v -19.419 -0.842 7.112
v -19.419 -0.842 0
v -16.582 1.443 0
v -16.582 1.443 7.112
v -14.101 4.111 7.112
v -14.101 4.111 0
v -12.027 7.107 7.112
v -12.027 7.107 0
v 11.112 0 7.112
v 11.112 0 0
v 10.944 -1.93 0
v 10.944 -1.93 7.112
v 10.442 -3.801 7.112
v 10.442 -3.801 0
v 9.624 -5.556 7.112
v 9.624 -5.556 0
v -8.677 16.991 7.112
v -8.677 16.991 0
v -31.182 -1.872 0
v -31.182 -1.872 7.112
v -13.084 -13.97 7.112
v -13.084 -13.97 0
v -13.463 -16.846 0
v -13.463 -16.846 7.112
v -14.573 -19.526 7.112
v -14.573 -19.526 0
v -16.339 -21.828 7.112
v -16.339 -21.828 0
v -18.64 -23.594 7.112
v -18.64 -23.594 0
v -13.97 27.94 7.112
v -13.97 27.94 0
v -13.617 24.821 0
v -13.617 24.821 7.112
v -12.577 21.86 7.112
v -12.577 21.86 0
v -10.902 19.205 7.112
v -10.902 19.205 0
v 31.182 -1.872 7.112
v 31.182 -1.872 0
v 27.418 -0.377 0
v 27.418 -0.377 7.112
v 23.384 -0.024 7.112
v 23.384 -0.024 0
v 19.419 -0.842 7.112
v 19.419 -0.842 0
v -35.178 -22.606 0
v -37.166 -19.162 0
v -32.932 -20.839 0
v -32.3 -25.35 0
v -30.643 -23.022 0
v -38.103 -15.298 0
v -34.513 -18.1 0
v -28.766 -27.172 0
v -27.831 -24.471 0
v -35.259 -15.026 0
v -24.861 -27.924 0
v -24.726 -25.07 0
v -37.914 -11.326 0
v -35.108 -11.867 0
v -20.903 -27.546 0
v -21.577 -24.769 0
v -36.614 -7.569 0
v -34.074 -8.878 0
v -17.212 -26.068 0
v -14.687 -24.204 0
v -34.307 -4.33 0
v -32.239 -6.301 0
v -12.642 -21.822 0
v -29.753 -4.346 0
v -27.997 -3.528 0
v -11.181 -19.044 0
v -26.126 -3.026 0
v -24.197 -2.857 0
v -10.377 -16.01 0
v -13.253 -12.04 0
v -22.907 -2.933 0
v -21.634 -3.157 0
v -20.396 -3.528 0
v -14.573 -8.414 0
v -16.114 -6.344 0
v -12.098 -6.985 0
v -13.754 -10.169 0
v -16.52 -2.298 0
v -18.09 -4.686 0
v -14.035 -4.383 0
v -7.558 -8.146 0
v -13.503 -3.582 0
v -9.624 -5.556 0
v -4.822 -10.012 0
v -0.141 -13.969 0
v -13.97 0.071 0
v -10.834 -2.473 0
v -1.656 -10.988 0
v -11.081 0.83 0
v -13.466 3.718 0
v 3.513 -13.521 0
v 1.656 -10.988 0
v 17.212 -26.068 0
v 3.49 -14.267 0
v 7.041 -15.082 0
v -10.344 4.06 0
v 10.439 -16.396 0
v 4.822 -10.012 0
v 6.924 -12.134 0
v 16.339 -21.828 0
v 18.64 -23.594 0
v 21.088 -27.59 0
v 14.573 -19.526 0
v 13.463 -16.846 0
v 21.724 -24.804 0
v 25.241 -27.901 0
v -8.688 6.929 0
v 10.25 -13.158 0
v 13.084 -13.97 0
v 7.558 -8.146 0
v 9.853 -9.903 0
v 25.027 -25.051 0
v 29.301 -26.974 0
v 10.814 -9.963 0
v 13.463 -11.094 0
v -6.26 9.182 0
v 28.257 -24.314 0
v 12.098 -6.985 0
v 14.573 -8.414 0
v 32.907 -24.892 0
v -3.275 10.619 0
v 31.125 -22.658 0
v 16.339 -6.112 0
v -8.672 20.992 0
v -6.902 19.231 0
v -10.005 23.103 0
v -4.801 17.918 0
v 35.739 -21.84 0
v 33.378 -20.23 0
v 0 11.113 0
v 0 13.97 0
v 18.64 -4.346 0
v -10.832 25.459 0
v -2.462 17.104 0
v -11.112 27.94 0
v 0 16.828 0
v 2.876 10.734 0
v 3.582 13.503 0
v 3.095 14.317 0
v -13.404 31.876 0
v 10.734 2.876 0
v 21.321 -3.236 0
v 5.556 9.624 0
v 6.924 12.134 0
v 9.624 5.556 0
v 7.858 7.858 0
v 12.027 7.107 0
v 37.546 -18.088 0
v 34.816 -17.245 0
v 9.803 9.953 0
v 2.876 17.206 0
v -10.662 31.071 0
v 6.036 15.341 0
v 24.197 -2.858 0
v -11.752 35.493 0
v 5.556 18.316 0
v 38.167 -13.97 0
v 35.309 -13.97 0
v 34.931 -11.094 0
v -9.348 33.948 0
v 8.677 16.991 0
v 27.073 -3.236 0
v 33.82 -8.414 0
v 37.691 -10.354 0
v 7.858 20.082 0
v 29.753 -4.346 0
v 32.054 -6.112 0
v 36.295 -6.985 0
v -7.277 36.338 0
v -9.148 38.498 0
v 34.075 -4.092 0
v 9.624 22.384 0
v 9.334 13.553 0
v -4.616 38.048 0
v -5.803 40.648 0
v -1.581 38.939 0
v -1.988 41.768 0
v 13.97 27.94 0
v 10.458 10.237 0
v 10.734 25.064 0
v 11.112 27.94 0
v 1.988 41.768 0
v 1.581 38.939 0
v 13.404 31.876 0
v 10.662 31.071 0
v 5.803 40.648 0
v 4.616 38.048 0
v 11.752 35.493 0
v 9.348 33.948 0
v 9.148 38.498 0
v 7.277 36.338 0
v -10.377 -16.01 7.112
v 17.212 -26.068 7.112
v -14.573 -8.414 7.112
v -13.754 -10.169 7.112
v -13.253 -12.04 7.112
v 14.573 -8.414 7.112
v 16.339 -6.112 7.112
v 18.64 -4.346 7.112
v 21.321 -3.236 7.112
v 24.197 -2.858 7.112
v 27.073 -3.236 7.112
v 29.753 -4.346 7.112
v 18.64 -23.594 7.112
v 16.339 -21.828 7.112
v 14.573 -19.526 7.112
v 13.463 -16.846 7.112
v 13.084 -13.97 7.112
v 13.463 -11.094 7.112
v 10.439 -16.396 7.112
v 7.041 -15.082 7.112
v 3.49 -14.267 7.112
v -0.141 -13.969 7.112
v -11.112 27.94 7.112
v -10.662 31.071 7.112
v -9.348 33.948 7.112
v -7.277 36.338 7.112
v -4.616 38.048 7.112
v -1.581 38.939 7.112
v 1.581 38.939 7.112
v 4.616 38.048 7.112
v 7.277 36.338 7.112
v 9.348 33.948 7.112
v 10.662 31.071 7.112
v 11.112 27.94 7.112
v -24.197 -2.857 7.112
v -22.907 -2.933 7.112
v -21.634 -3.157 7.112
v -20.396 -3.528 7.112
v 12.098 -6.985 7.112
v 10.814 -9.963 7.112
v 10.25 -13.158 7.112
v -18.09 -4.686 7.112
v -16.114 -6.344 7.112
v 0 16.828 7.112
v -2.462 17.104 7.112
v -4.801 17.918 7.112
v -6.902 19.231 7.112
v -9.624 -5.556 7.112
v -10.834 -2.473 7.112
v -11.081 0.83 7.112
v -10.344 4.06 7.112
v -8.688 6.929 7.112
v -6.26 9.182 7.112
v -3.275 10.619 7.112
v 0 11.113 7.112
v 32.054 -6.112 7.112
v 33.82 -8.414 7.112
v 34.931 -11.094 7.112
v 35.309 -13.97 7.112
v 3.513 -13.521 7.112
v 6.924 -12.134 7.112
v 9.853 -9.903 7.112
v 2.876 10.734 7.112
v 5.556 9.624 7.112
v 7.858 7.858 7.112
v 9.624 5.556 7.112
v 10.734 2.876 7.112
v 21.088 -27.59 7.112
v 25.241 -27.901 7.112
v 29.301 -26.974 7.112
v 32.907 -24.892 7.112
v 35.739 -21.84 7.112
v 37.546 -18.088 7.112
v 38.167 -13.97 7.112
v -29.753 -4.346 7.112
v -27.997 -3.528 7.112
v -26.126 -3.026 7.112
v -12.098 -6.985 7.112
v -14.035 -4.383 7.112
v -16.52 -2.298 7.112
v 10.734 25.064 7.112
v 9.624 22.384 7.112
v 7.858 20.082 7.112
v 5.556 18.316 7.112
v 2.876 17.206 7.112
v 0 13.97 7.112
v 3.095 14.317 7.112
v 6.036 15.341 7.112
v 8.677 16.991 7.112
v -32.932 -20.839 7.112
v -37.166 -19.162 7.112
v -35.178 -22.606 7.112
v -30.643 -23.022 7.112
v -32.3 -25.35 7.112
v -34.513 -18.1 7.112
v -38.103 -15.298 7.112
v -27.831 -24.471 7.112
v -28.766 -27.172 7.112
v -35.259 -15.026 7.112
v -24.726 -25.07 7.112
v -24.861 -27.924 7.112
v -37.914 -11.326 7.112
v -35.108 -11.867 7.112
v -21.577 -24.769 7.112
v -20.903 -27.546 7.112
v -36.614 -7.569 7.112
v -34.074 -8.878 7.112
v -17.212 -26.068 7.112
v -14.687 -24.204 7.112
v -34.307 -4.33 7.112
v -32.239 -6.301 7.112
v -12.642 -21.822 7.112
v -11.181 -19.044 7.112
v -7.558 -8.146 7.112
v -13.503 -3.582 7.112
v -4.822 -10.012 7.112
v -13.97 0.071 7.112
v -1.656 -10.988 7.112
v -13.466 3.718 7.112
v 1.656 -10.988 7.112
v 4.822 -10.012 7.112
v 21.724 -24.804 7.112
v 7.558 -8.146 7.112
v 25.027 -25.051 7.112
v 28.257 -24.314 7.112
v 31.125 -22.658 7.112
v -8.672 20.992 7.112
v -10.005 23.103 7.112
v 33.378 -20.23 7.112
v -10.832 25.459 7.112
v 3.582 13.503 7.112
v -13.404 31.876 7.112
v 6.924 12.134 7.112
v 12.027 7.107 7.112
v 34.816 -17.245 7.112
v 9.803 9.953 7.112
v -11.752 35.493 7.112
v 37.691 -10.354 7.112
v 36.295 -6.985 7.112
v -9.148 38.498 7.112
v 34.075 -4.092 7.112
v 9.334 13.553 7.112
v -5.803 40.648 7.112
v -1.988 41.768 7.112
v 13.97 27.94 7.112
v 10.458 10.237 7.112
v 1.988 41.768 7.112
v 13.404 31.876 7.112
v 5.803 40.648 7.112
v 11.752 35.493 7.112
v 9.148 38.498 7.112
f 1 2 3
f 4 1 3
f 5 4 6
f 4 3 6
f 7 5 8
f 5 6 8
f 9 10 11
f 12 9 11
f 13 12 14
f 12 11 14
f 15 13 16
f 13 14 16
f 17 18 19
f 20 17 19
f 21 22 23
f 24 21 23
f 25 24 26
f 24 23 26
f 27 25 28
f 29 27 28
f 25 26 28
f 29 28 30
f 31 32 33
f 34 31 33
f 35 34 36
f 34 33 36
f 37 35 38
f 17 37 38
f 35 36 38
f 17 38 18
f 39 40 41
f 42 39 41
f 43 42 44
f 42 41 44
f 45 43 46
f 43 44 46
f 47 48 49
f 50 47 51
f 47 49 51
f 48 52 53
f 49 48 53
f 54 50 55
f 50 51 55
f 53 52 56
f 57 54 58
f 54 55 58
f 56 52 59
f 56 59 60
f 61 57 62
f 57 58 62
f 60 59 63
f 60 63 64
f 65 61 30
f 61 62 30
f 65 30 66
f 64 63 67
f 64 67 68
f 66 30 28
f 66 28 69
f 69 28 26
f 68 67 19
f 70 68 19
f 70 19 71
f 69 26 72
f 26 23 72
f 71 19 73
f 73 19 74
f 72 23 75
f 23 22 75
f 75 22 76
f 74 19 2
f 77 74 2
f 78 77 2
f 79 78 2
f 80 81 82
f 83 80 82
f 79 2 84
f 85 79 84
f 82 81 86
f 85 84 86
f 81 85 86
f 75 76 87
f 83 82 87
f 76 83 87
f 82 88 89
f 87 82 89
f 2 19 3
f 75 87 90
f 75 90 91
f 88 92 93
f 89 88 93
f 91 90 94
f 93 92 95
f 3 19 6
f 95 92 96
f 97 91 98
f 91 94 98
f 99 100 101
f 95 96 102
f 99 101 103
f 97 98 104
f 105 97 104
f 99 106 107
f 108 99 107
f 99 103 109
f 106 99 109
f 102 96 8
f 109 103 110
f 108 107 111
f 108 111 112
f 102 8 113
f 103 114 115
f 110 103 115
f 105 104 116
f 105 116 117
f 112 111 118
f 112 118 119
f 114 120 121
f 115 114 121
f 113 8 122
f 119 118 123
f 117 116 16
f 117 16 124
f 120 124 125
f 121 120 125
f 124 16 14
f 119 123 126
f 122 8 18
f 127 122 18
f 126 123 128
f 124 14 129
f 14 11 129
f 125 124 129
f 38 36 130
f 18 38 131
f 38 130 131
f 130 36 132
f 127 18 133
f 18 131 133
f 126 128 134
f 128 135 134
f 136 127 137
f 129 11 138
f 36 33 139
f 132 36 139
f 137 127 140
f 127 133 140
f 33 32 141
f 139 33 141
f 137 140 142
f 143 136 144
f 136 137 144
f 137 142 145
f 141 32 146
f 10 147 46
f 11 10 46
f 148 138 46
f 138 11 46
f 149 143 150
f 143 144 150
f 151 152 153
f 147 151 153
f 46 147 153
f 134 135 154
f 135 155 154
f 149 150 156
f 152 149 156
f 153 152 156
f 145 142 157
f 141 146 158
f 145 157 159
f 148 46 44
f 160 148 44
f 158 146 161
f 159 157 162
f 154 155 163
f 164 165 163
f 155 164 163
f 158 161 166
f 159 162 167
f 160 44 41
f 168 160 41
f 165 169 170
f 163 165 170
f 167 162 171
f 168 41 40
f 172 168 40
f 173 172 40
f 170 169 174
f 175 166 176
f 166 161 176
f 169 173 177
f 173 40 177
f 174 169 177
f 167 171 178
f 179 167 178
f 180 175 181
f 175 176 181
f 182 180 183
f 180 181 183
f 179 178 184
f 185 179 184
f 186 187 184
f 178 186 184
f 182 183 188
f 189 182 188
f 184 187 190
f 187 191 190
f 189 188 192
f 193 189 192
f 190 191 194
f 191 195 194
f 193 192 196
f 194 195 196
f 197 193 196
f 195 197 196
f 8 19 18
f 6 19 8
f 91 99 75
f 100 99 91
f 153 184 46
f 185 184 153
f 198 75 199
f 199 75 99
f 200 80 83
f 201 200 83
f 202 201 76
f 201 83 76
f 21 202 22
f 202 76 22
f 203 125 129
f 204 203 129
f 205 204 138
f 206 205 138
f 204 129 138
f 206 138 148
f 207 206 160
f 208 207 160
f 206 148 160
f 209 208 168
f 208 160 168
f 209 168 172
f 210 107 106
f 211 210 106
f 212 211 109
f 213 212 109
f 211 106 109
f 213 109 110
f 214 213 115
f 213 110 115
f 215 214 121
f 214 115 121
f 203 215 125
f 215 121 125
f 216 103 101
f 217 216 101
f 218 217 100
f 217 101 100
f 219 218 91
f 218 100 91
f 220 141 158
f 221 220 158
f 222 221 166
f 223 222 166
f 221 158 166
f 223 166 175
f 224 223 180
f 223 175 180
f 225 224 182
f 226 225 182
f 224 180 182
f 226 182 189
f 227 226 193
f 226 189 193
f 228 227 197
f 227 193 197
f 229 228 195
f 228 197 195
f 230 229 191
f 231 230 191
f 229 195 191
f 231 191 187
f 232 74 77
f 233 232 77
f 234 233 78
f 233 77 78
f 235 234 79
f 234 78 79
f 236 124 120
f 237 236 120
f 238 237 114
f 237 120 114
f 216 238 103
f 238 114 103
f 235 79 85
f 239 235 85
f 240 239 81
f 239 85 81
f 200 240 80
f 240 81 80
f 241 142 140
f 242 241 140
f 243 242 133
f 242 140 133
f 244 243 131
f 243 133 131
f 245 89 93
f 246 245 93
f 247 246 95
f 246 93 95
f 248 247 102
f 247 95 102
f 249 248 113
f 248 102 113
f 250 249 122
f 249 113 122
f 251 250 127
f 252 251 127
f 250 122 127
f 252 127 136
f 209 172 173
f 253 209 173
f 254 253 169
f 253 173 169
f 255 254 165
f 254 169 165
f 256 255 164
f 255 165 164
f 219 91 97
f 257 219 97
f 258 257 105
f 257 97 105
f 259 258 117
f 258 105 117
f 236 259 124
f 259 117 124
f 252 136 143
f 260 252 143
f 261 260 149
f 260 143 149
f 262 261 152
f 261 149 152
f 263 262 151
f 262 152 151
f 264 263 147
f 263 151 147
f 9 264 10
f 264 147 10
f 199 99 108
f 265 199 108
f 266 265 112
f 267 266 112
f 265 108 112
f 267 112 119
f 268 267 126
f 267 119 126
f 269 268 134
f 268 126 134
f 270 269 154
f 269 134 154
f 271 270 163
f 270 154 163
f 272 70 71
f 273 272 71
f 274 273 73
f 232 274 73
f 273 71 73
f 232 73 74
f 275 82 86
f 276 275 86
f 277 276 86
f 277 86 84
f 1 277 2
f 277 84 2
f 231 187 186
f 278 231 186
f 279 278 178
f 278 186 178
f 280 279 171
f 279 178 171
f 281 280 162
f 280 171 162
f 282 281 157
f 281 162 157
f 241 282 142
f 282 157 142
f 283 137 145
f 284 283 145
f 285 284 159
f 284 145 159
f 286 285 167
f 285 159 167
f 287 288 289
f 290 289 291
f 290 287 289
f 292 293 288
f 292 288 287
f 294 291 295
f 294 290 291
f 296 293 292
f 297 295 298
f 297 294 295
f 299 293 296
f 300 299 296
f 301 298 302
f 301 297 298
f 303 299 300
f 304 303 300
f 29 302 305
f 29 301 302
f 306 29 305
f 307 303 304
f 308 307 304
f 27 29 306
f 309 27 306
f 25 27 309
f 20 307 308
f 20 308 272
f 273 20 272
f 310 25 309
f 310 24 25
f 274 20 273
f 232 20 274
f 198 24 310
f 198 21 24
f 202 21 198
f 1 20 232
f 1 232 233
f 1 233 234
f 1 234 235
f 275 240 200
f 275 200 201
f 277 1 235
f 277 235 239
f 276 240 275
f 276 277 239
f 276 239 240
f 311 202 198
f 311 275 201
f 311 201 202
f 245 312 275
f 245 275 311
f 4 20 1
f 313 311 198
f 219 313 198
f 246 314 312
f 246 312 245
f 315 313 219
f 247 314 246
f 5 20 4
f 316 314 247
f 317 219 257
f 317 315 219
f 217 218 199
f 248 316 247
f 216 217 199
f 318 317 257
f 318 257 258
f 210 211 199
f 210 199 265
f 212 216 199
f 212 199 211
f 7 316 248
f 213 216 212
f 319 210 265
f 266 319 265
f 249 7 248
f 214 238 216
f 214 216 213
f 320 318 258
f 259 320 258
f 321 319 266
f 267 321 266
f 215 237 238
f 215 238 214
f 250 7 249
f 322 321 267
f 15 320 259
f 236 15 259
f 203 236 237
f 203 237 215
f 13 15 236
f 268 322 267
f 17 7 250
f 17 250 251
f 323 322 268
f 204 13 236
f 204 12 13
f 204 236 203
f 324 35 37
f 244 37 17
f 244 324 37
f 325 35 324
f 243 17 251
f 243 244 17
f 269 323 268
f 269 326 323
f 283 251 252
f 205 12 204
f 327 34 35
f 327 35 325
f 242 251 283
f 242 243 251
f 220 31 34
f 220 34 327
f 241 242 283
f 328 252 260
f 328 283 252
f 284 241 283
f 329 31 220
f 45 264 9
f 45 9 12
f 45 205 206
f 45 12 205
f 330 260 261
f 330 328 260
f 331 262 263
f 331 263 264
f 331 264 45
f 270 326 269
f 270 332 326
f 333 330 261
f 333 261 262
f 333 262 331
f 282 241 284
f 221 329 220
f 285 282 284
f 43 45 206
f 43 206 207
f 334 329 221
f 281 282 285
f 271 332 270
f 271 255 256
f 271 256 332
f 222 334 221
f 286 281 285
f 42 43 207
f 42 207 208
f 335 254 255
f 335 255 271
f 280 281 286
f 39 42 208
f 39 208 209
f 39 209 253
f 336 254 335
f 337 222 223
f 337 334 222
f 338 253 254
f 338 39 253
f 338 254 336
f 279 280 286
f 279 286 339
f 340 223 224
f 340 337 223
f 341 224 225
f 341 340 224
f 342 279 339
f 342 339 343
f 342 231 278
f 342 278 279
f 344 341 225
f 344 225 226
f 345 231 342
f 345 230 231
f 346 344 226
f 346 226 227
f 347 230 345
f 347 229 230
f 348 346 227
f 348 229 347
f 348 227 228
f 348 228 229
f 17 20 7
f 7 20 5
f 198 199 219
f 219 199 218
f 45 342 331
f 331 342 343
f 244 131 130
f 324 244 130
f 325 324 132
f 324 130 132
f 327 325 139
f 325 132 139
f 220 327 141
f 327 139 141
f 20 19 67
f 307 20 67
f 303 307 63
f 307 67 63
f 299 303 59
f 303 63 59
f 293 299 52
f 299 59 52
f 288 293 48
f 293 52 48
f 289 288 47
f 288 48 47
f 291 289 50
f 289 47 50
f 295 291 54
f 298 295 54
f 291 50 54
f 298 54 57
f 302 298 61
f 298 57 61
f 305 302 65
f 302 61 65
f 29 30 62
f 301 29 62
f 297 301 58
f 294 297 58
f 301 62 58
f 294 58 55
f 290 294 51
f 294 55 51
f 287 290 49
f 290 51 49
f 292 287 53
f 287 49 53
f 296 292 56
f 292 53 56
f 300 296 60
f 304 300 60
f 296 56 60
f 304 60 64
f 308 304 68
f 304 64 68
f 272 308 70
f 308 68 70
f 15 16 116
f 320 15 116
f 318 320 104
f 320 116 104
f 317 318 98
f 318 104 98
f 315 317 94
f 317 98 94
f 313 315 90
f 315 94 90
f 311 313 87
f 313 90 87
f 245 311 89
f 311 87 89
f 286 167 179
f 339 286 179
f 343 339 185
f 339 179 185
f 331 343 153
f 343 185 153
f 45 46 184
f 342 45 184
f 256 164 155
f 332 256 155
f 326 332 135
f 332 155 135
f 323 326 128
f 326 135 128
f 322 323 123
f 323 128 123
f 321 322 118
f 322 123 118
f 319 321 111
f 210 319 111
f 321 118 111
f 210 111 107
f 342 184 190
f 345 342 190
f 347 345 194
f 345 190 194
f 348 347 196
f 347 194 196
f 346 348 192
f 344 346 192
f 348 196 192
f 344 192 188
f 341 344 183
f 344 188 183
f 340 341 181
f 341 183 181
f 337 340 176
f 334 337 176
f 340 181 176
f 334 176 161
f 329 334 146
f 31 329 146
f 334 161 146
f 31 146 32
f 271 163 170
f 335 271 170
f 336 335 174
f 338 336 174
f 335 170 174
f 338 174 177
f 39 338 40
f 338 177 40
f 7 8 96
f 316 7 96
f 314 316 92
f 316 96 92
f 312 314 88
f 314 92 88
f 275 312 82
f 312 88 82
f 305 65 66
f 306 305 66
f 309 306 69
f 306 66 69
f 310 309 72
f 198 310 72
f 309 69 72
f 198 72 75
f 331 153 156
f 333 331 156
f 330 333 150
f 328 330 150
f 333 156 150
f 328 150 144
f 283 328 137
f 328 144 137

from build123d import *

# Parameters (mm, degrees)
F1_DEPTH = 7.112


# Not quite as in the source:
# - ends of sketch curves that miss each other by under 0.0002 mm in the source are joined
# - a feature names something its author has since deleted; it is built from what else it names


with BuildPart() as f1:
    # F0 (on Top) → F1 (new body)
    with BuildSketch(Plane.XY):
        with BuildLine():
            ThreePointArc((0, 11.1125), (7.8577241059, 7.8577241059), (11.1125, 0))
            ThreePointArc((11.1125, 0), (10.7338507446, -2.8761266387), (9.6237072996, -5.55625))
            Line((9.6237072996, -5.55625), (12.0983748909, -6.985))
            ThreePointArc((12.0983748909, -6.985), (13.4939838315, -3.6157019175), (13.97, 0))
            ThreePointArc((13.97, 0), (13.4755323786, 3.6838739276), (12.0271328398, 7.1069666985))
            ThreePointArc((12.0271328398, 7.1069666985), (6.9237480813, 12.133532565), (-1.95e-08, 13.97))
            Line((-1.95e-08, 13.97), (0, 11.1125))
        make_face()
        with BuildLine():
            ThreePointArc((-9.6237072996, -5.55625), (-9.6237072996, 5.55625), (0, 11.1125))
            Line((0, 11.1125), (0, 13.97))
            ThreePointArc((-1.95e-08, 13.97), (-6.9237478038, 12.1335327234), (-12.0271324949, 7.1069672823))
            ThreePointArc((-12.0271324949, 7.1069672823), (-13.9698214779, 0.0706248839), (-12.0983748909, -6.985))
            Line((-12.0983748909, -6.985), (-9.6237072996, -5.55625))
        make_face()
        with BuildLine():
            Line((12.0983748909, -6.985), (9.6237072996, -5.55625))
            ThreePointArc((9.6237072996, -5.55625), (0, -11.1125), (-9.6237072996, -5.55625))
            Line((-9.6237072996, -5.55625), (-12.0983748909, -6.985))
            ThreePointArc((-12.0983748909, -6.985), (-7.0460734842, -12.0629079602), (-0.1412475033, -13.969285921))
            ThreePointArc((-0.1412475033, -13.969285921), (6.9237481232, -12.1335325411), (12.0983748909, -6.985))
        make_face()
        with BuildLine():
            ThreePointArc((-8.6769039474, 16.9913819188), (-4.593947408, 14.7469507993), (-1.95e-08, 13.97))
            Line((0, 13.97), (0, 16.8275))
            ThreePointArc((0, 16.8275), (-3.65427634, 17.4455290423), (-6.9020826854, 19.2308719809))
            Line((-6.9020826854, 19.2308719809), (-8.6769039474, 16.9913819188))
        make_face()
        with BuildLine():
            ThreePointArc((-12.0271324949, 7.1069672823), (-6.9237478038, 12.1335327234), (-1.95e-08, 13.97))
            ThreePointArc((-1.95e-08, 13.97), (-4.593947408, 14.7469507993), (-8.6769039474, 16.9913819188))
            ThreePointArc((-8.6769039474, 16.9913819188), (-9.8388621787, 11.8752452293), (-12.0271324949, 7.1069672823))
        make_face()
        with BuildLine():
            Line((0, 16.8275), (0, 13.97))
            ThreePointArc((-1.95e-08, 13.97), (4.5939473896, 14.7469507929), (8.6769039474, 16.9913819188))
            ThreePointArc((8.6769039474, 16.9913819188), (12.5773059147, 21.8595168015), (13.97, 27.94))
            Line((13.97, 27.94), (11.1125, 27.94))
            ThreePointArc((11.1125, 27.94), (7.8577241059, 20.0822758941), (0, 16.8275))
        make_face()
        with BuildLine():
            ThreePointArc((19.4187283795, -0.8424940876), (15.2170069875, -3.2683590347), (12.0983750385, -6.9849997443))
            Line((12.0983750385, -6.9849997443), (14.5730424822, -8.41375))
            ThreePointArc((14.5730424822, -8.41375), (21.320623143, -3.2361492554), (29.7529997817, -4.3462927004))
            Line((29.7529997817, -4.3462927004), (31.1817497817, -1.8716251091))
            ThreePointArc((31.1817497817, -1.8716251091), (25.4143155079, -0.0531600677), (19.4187283795, -0.8424940876))
        make_face()
        with BuildLine():
            ThreePointArc((13.97, 0), (13.4939838315, -3.6157019175), (12.0983750385, -6.9849997443))
            ThreePointArc((12.0983750385, -6.9849997443), (15.2170069875, -3.2683590347), (19.4187283795, -0.8424940876))
            ThreePointArc((19.4187283795, -0.8424940876), (15.2933094518, 2.7327644521), (12.0271328398, 7.1069666985))
            ThreePointArc((12.0271328398, 7.1069666985), (13.4755323786, 3.6838739276), (13.97, 0))
        make_face()
        with BuildLine():
            Line((14.5730424822, -8.41375), (12.0983748909, -6.985))
            ThreePointArc((12.0983748909, -6.985), (10.4389854978, -11.5441348126), (10.4389854722, -16.395865042))
            ThreePointArc((10.4389854722, -16.395865042), (12.753195723, -21.9828628158), (17.2117497817, -26.0683748909))
            Line((17.2117497817, -26.0683748909), (18.6404997817, -23.5937072996))
            ThreePointArc((18.6404997817, -23.5937072996), (13.4628990371, -16.8461266387), (14.5730424822, -8.41375))
        make_face()
        with BuildLine():
            ThreePointArc((-10.2267497817, -13.97), (-10.7027659885, -10.3542979399), (-12.0983748909, -6.985))
            Line((-12.0983748909, -6.985), (-14.5730424822, -8.41375))
            ThreePointArc((-14.5730424822, -8.41375), (-13.4628990371, -11.0938733613), (-13.0842497817, -13.97))
            ThreePointArc((-13.0842497817, -13.97), (-14.5730424822, -19.52625), (-18.6404997817, -23.5937072996))
            Line((-18.6404997817, -23.5937072996), (-17.2117497817, -26.0683748909))
            ThreePointArc((-17.2117497817, -26.0683748909), (-12.6422439072, -21.8220248341), (-10.3765164134, -16.010110204))
            ThreePointArc((-10.3765164134, -16.010110204), (-10.2642417492, -14.9928000402), (-10.2267497817, -13.97))
        make_face()
        with BuildLine():
            ThreePointArc((-0.1412475033, -13.969285921), (-7.0460734842, -12.0629079602), (-12.0983748909, -6.985))
            ThreePointArc((-12.0983748909, -6.985), (-10.7027659885, -10.3542979399), (-10.2267497817, -13.97))
            ThreePointArc((-10.2267497817, -13.97), (-10.2642417492, -14.9928000402), (-10.3765164134, -16.010110204))
            ThreePointArc((-10.3765164134, -16.010110204), (-5.36483273, -14.4583271608), (-0.1412475033, -13.969285921))
        make_face()
        with BuildLine():
            Line((-14.5730424822, -8.41375), (-12.0983748909, -6.985))
            ThreePointArc((-12.0983748909, -6.985), (-15.2170068744, -3.2683591296), (-19.4187283795, -0.8424940876))
            Line((-19.4187283795, -0.8424940876), (-20.396050939, -3.5276657515))
            ThreePointArc((-20.396050939, -3.5276657515), (-17.0537724691, -5.4573311258), (-14.5730424822, -8.41375))
        make_face()
        with BuildLine():
            ThreePointArc((8.6769039474, 16.9913819188), (9.8388622875, 11.8752449082), (12.0271328398, 7.1069666985))
            ThreePointArc((12.0271328398, 7.1069666985), (15.2933094518, 2.7327644521), (19.4187283795, -0.8424940876))
            Line((19.4187283795, -0.8424940876), (13.97, 27.94))
            ThreePointArc((13.97, 27.94), (12.5773059147, 21.8595168015), (8.6769039474, 16.9913819188))
        make_face()
        with BuildLine():
            ThreePointArc((-19.4187283795, -0.8424940876), (-15.293309221, 2.7327647003), (-12.0271324949, 7.1069672823))
            ThreePointArc((-12.0271324949, 7.1069672823), (-9.8388621787, 11.8752452293), (-8.6769039474, 16.9913819188))
            Line((-8.6769039474, 16.9913819188), (-31.1817497817, -1.8716251091))
            ThreePointArc((-31.1817497817, -1.8716251091), (-27.8124518418, -0.4760162067), (-24.1967497817, 0))
            ThreePointArc((-24.1967497817, 0), (-21.7708847397, -0.2122356904), (-19.4187283795, -0.8424940876))
        make_face()
        with BuildLine():
            ThreePointArc((-13.97, 27.94), (-12.5773059147, 21.8595168015), (-8.6769039474, 16.9913819188))
            Line((-8.6769039474, 16.9913819188), (-6.9020826854, 19.2308719809))
            ThreePointArc((-6.9020826854, 19.2308719809), (-10.0046751594, 23.1032520012), (-11.1125, 27.94))
            Line((-11.1125, 27.94), (-13.97, 27.94))
        make_face()
        with BuildLine():
            ThreePointArc((10.4389854722, -16.395865042), (5.2800111814, -14.6107766948), (-0.1412475033, -13.969285921))
            ThreePointArc((-0.1412475033, -13.969285921), (-5.36483273, -14.4583271608), (-10.3765164134, -16.010110204))
            Line((-10.3765164134, -16.010110204), (17.2117497817, -26.0683748909))
            ThreePointArc((17.2117497817, -26.0683748909), (12.753195723, -21.9828628158), (10.4389854722, -16.395865042))
        make_face()
        with BuildLine():
            Line((-20.396050939, -3.5276657515), (-19.4187283795, -0.8424940876))
            ThreePointArc((-19.4187283795, -0.8424940876), (-21.7708847397, -0.2122356904), (-24.1967497817, 0))
            Line((-24.1967497817, 0), (-24.1967497817, -2.8575))
            ThreePointArc((-24.1967497817, -2.8575), (-22.2670844074, -3.0263238447), (-20.396050939, -3.5276657515))
        make_face()
        with BuildLine():
            ThreePointArc((-11.1125, 27.94), (0, 39.0525), (11.1125, 27.94))
            Line((11.1125, 27.94), (13.97, 27.94))
            ThreePointArc((13.97, 27.94), (0, 41.91), (-13.97, 27.94))
            Line((-13.97, 27.94), (-11.1125, 27.94))
        make_face()
        with BuildLine():
            Line((-29.7529997817, -4.3462927004), (-31.1817497817, -1.8716251091))
            ThreePointArc((-31.1817497817, -1.8716251091), (-36.2951246726, -20.955), (-17.2117497817, -26.0683748909))
            Line((-17.2117497817, -26.0683748909), (-18.6404997817, -23.5937072996))
            ThreePointArc((-18.6404997817, -23.5937072996), (-33.8204570813, -19.52625), (-29.7529997817, -4.3462927004))
        make_face()
        with BuildLine():
            ThreePointArc((-24.1967497817, 0), (-27.8124518418, -0.4760162067), (-31.1817497817, -1.8716251091))
            Line((-31.1817497817, -1.8716251091), (-29.7529997817, -4.3462927004))
            ThreePointArc((-29.7529997817, -4.3462927004), (-27.0728764204, -3.2361492554), (-24.1967497817, -2.8575))
            Line((-24.1967497817, -2.8575), (-24.1967497817, 0))
        make_face()
        with BuildLine():
            Line((31.1817497817, -1.8716251091), (29.7529997817, -4.3462927004))
            ThreePointArc((29.7529997817, -4.3462927004), (33.8204570813, -8.41375), (35.3092497817, -13.97))
            ThreePointArc((35.3092497817, -13.97), (29.7529997817, -23.5937072996), (18.6404997817, -23.5937072996))
            Line((18.6404997817, -23.5937072996), (17.2117497817, -26.0683748909))
            ThreePointArc((17.2117497817, -26.0683748909), (31.1817497817, -26.0683748909), (38.1667497817, -13.97))
            ThreePointArc((38.1667497817, -13.97), (36.2951246726, -6.985), (31.1817497817, -1.8716251091))
        make_face()
    extrude(amount=F1_DEPTH)


solid = f1.part
